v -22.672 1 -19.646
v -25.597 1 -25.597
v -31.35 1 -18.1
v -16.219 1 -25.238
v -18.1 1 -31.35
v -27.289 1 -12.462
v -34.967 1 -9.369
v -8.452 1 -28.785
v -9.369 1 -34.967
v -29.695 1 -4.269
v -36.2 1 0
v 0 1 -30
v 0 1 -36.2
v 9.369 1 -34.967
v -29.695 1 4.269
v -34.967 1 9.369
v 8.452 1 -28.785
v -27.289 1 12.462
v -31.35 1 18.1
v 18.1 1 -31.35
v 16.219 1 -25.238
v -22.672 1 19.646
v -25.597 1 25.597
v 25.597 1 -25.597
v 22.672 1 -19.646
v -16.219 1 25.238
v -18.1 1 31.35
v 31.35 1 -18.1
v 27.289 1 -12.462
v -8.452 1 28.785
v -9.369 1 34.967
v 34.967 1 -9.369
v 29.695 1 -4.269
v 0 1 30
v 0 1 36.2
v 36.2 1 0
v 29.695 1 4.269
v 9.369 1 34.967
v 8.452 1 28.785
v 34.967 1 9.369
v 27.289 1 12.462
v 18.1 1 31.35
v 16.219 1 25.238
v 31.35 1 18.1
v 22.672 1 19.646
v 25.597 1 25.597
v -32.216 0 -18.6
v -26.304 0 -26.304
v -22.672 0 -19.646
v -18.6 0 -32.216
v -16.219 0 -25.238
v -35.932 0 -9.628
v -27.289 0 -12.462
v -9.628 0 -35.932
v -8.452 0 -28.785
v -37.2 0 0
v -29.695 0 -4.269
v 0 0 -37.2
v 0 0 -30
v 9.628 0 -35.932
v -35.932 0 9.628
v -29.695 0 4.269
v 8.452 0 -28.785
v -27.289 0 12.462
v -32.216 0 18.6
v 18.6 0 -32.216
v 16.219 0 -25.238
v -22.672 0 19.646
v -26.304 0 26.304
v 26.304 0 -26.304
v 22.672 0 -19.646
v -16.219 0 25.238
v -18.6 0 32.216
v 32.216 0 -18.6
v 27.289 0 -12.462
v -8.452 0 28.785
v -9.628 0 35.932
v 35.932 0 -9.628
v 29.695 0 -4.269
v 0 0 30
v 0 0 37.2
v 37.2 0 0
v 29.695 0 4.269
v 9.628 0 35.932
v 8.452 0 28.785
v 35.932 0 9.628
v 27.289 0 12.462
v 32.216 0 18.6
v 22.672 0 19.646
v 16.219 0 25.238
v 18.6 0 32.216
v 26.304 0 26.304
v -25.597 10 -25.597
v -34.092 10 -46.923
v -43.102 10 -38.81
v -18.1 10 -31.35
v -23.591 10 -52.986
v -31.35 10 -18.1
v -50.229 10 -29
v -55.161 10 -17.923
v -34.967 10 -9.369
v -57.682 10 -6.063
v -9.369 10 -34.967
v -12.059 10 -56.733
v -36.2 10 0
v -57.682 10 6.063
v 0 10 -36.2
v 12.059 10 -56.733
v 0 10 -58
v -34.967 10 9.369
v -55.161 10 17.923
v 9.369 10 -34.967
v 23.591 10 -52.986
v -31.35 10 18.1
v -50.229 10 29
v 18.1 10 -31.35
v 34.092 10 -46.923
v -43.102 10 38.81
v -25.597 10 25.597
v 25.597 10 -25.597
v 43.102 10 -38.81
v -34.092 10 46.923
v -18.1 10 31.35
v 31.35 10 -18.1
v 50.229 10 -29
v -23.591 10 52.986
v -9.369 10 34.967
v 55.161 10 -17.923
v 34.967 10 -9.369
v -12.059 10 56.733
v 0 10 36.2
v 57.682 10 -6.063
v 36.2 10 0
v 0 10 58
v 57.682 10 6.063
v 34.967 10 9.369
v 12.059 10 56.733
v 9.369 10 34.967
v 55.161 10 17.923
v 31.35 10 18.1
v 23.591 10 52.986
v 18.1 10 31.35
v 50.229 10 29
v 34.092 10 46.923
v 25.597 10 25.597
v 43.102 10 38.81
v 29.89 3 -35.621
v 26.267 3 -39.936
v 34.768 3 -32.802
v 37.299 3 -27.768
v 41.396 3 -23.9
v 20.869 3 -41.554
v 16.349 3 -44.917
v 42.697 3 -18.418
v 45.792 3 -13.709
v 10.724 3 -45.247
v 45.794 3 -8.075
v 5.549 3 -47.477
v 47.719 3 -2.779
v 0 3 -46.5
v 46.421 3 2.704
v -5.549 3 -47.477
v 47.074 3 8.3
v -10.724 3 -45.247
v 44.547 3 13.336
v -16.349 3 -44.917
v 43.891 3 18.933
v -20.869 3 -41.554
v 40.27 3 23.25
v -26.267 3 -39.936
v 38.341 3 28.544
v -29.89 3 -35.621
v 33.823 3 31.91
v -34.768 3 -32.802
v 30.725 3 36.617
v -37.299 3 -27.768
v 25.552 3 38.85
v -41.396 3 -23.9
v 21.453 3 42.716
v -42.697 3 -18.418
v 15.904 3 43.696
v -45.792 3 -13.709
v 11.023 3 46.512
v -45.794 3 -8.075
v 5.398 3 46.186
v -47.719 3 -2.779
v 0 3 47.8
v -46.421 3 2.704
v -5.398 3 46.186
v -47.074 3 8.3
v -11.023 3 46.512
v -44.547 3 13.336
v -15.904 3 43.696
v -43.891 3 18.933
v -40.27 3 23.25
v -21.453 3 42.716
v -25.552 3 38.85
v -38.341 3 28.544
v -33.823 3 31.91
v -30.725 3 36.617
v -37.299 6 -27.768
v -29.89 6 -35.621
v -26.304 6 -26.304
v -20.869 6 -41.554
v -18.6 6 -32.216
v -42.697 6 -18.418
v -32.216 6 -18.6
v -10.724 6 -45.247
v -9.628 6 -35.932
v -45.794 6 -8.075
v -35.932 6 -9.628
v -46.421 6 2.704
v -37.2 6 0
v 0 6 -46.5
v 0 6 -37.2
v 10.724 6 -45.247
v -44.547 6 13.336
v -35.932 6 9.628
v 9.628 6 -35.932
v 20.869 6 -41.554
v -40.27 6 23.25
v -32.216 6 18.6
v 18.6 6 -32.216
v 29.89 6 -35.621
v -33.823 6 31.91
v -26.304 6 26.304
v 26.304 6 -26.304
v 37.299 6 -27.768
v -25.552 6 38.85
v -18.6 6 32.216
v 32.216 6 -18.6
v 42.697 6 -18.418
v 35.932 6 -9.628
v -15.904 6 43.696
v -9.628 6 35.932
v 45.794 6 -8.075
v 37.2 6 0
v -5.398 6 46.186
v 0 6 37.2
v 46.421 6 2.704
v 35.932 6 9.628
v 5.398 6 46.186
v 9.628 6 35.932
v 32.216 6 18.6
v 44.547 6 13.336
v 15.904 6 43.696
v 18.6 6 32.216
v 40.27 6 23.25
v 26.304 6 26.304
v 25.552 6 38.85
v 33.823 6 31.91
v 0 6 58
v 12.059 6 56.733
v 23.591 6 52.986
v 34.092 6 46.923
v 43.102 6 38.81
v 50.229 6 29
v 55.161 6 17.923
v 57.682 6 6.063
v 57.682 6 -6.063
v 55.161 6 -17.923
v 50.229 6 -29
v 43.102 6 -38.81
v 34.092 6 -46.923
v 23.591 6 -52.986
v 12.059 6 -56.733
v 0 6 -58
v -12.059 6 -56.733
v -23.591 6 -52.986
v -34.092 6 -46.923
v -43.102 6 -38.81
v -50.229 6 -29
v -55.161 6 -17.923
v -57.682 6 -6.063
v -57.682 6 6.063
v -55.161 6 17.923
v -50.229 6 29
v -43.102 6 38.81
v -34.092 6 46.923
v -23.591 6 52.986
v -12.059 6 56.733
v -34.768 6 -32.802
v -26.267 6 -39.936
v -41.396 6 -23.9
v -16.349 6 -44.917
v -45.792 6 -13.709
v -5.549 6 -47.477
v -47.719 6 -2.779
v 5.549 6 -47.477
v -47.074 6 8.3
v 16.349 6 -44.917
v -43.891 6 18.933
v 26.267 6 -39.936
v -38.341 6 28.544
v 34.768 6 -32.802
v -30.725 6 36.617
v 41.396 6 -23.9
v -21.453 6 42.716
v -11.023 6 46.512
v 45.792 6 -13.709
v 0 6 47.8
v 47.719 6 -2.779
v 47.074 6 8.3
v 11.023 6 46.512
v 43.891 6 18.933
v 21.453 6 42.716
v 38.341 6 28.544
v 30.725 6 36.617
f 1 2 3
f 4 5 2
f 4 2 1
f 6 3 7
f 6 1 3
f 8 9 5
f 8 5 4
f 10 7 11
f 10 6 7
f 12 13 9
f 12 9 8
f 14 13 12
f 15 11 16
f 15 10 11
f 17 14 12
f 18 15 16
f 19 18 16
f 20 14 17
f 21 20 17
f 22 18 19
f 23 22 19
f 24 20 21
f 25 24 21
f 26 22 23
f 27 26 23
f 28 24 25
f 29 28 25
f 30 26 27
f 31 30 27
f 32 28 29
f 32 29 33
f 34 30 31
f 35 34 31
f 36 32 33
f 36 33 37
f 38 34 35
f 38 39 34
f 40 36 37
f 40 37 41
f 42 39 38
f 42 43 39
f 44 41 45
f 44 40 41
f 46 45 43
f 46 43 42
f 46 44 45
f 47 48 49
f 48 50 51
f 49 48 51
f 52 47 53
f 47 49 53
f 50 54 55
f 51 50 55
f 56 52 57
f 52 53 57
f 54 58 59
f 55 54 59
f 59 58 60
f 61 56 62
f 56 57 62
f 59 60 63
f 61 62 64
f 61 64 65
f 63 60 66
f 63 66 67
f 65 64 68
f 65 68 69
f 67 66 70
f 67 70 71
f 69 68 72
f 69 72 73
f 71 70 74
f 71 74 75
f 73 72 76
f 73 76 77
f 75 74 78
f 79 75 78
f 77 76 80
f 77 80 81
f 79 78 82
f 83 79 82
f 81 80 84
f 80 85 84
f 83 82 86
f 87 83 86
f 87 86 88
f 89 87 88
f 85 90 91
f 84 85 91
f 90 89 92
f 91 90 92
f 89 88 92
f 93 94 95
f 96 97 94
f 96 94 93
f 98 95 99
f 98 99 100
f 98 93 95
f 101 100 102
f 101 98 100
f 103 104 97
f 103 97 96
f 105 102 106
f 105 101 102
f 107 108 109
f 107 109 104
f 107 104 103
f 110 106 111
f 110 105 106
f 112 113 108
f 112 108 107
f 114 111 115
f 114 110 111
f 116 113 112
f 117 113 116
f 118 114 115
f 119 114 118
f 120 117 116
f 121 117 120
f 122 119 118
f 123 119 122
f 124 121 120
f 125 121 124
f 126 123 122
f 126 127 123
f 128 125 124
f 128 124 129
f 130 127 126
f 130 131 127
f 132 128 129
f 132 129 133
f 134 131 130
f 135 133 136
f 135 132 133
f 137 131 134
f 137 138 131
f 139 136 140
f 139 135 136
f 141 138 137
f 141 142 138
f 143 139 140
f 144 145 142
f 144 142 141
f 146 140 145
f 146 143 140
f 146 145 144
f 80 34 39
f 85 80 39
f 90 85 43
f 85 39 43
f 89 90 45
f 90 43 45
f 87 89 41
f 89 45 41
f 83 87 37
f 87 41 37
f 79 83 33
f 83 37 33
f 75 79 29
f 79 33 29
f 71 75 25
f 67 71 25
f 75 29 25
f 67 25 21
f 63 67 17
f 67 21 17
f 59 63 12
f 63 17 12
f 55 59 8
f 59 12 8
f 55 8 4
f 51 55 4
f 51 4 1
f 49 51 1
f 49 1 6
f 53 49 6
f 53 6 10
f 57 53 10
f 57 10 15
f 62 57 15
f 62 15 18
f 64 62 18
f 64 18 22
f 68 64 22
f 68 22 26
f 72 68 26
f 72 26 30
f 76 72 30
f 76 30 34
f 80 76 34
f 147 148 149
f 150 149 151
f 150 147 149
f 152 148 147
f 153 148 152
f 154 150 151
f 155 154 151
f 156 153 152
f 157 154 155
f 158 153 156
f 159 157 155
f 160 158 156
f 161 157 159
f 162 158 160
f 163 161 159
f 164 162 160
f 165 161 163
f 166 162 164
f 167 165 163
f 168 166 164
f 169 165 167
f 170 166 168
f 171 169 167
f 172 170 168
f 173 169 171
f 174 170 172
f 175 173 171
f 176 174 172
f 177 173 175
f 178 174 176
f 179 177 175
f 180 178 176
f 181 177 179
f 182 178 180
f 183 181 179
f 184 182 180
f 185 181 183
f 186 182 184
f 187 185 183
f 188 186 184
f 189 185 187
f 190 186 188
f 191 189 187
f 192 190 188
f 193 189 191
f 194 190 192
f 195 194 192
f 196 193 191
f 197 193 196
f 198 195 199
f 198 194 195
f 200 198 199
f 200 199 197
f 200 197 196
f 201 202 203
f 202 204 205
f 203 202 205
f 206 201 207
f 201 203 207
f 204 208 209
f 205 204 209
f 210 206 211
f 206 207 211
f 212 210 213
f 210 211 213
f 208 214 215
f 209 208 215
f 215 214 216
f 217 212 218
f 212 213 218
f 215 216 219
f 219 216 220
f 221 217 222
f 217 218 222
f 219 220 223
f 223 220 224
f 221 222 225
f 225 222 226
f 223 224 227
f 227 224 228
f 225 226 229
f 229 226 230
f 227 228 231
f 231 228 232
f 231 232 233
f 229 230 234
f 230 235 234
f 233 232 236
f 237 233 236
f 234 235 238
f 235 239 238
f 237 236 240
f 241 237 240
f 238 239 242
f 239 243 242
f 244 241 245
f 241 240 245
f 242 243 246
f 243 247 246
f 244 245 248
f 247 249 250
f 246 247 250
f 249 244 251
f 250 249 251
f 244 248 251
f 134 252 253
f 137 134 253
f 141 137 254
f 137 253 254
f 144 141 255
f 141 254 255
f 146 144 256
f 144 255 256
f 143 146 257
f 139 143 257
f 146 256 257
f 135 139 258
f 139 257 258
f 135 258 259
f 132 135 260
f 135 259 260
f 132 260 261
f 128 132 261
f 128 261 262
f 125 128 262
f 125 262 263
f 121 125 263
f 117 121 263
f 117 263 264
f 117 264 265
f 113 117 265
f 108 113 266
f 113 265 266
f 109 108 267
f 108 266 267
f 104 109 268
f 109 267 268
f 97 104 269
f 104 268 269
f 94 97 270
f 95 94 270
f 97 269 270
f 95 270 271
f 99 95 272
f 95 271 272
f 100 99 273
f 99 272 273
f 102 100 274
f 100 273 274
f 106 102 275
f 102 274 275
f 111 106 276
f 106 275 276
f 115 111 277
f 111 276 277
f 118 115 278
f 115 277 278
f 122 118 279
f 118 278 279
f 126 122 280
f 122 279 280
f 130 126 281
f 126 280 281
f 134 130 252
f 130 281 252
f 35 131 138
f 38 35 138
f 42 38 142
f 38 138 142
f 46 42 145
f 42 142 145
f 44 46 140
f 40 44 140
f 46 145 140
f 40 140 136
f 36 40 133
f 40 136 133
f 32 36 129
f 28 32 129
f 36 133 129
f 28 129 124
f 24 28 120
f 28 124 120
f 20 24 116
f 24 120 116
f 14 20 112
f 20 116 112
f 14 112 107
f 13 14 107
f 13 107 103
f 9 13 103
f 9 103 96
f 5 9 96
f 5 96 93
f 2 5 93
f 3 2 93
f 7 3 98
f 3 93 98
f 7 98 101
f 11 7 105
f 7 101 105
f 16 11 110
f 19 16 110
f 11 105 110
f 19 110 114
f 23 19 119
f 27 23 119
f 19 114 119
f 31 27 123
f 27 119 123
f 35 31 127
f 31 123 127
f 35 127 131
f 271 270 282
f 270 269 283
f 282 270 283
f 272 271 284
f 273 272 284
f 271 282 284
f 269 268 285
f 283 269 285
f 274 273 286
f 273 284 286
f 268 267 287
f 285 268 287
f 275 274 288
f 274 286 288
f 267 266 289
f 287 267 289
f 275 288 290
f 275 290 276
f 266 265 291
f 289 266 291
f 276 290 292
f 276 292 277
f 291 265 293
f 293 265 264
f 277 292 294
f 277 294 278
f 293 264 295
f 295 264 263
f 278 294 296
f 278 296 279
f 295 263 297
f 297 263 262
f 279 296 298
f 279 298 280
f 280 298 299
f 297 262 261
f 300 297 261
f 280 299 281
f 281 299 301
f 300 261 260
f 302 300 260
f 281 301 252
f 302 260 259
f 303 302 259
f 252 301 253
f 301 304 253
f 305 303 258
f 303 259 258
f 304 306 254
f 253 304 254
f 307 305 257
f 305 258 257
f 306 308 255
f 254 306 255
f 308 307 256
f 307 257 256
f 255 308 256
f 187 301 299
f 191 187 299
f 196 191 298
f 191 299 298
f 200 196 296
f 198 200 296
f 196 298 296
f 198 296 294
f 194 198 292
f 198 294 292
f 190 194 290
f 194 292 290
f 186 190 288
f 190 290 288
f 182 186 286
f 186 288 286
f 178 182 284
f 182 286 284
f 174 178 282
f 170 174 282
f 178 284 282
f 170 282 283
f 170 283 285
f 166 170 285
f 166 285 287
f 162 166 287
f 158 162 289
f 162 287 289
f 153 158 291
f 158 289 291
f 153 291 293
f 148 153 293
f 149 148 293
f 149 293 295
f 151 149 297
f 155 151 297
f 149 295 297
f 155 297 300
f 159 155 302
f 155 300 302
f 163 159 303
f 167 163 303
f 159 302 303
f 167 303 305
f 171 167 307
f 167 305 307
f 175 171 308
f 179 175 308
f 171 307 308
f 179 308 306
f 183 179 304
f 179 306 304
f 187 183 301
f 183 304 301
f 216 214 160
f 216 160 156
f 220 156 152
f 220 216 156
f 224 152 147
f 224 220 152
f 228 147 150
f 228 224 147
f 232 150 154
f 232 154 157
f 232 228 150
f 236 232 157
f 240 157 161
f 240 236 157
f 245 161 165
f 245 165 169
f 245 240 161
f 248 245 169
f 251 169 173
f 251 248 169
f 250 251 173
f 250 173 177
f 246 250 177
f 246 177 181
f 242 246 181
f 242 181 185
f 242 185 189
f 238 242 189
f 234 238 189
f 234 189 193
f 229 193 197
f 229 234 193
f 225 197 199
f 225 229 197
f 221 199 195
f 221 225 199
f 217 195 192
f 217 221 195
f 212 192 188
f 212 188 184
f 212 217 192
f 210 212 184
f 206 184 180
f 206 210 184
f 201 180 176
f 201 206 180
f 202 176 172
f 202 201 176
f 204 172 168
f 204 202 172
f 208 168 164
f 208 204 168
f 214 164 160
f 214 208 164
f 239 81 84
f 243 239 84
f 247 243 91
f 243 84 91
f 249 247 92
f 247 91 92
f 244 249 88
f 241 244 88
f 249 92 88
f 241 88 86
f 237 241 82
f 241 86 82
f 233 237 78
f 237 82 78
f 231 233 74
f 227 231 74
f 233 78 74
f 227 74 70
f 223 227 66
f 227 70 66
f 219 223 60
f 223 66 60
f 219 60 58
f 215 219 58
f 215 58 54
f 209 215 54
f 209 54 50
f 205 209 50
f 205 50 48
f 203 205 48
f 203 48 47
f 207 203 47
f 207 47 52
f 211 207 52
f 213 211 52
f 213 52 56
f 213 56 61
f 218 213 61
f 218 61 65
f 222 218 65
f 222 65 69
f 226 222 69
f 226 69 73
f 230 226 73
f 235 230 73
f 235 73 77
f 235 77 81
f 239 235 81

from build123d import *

# Parameters (mm, degrees)
SKETCH3_R           = 37.2
BOSS_EXTRUDE1_DEPTH = 10
SKETCH4_R           = 36.2
CUT_EXTRUDE1_DEPTH  = 9
SKETCH5_R           = 30
CUT_EXTRUDE2_DEPTH  = 9
SKETCH6_R           = 58
SKETCH6_R_2         = 37.2
BOSS_EXTRUDE2_DEPTH = 4
SKETCH7_R           = 47.8
SKETCH7_R_2         = 46.5
BOSS_EXTRUDE3_DEPTH = 3


with BuildPart() as part:
    # Sketch3 → Boss-Extrude1 (new body)
    with BuildSketch(Plane(origin=(0, 0, 0), x_dir=(1, 0, 0), z_dir=(0, 1, 0))):
        with Locations(Location((0, 0, 0), (0, 0, 270))):
            Circle(SKETCH3_R)
    extrude(amount=BOSS_EXTRUDE1_DEPTH)

    # Sketch4 → Cut-Extrude1 (cut)
    with BuildSketch(Plane(origin=(0, 10, 0), x_dir=(1, 0, 0), z_dir=(0, 1, 0))):
        with Locations(Location((0, 0, 0), (0, 0, 270))):
            Circle(SKETCH4_R)
    extrude(amount=-CUT_EXTRUDE1_DEPTH, mode=Mode.SUBTRACT)

    # Sketch5 → Cut-Extrude2 (cut)
    with BuildSketch(Plane(origin=(0, 1, 0), x_dir=(1, 0, 0), z_dir=(0, 1, 0))):
        with Locations(Location((0, 0, 0), (0, 0, 270))):
            Circle(SKETCH5_R)
    extrude(amount=-CUT_EXTRUDE2_DEPTH, mode=Mode.SUBTRACT)

    # Sketch6 → Boss-Extrude2 (add)
    with BuildSketch(Plane(origin=(0, 6, 0), x_dir=(1, 0, 0), z_dir=(0, 1, 0))):
        with Locations(Location((0, 0, 0), (0, 0, 270))):
            Circle(SKETCH6_R)
        with Locations(Location((0, 0, 0), (0, 0, 270))):
            Circle(SKETCH6_R_2, mode=Mode.SUBTRACT)
    extrude(amount=BOSS_EXTRUDE2_DEPTH)

    # Sketch7 → Boss-Extrude3 (add)
    with BuildSketch(Plane.XZ.offset(-6)):
        with Locations(Location((0, 0, 0), (0, 0, 90))):
            Circle(SKETCH7_R)
        with Locations(Location((0, 0, 0), (0, 0, 270))):
            Circle(SKETCH7_R_2, mode=Mode.SUBTRACT)
    extrude(amount=BOSS_EXTRUDE3_DEPTH)


solid = part.part
